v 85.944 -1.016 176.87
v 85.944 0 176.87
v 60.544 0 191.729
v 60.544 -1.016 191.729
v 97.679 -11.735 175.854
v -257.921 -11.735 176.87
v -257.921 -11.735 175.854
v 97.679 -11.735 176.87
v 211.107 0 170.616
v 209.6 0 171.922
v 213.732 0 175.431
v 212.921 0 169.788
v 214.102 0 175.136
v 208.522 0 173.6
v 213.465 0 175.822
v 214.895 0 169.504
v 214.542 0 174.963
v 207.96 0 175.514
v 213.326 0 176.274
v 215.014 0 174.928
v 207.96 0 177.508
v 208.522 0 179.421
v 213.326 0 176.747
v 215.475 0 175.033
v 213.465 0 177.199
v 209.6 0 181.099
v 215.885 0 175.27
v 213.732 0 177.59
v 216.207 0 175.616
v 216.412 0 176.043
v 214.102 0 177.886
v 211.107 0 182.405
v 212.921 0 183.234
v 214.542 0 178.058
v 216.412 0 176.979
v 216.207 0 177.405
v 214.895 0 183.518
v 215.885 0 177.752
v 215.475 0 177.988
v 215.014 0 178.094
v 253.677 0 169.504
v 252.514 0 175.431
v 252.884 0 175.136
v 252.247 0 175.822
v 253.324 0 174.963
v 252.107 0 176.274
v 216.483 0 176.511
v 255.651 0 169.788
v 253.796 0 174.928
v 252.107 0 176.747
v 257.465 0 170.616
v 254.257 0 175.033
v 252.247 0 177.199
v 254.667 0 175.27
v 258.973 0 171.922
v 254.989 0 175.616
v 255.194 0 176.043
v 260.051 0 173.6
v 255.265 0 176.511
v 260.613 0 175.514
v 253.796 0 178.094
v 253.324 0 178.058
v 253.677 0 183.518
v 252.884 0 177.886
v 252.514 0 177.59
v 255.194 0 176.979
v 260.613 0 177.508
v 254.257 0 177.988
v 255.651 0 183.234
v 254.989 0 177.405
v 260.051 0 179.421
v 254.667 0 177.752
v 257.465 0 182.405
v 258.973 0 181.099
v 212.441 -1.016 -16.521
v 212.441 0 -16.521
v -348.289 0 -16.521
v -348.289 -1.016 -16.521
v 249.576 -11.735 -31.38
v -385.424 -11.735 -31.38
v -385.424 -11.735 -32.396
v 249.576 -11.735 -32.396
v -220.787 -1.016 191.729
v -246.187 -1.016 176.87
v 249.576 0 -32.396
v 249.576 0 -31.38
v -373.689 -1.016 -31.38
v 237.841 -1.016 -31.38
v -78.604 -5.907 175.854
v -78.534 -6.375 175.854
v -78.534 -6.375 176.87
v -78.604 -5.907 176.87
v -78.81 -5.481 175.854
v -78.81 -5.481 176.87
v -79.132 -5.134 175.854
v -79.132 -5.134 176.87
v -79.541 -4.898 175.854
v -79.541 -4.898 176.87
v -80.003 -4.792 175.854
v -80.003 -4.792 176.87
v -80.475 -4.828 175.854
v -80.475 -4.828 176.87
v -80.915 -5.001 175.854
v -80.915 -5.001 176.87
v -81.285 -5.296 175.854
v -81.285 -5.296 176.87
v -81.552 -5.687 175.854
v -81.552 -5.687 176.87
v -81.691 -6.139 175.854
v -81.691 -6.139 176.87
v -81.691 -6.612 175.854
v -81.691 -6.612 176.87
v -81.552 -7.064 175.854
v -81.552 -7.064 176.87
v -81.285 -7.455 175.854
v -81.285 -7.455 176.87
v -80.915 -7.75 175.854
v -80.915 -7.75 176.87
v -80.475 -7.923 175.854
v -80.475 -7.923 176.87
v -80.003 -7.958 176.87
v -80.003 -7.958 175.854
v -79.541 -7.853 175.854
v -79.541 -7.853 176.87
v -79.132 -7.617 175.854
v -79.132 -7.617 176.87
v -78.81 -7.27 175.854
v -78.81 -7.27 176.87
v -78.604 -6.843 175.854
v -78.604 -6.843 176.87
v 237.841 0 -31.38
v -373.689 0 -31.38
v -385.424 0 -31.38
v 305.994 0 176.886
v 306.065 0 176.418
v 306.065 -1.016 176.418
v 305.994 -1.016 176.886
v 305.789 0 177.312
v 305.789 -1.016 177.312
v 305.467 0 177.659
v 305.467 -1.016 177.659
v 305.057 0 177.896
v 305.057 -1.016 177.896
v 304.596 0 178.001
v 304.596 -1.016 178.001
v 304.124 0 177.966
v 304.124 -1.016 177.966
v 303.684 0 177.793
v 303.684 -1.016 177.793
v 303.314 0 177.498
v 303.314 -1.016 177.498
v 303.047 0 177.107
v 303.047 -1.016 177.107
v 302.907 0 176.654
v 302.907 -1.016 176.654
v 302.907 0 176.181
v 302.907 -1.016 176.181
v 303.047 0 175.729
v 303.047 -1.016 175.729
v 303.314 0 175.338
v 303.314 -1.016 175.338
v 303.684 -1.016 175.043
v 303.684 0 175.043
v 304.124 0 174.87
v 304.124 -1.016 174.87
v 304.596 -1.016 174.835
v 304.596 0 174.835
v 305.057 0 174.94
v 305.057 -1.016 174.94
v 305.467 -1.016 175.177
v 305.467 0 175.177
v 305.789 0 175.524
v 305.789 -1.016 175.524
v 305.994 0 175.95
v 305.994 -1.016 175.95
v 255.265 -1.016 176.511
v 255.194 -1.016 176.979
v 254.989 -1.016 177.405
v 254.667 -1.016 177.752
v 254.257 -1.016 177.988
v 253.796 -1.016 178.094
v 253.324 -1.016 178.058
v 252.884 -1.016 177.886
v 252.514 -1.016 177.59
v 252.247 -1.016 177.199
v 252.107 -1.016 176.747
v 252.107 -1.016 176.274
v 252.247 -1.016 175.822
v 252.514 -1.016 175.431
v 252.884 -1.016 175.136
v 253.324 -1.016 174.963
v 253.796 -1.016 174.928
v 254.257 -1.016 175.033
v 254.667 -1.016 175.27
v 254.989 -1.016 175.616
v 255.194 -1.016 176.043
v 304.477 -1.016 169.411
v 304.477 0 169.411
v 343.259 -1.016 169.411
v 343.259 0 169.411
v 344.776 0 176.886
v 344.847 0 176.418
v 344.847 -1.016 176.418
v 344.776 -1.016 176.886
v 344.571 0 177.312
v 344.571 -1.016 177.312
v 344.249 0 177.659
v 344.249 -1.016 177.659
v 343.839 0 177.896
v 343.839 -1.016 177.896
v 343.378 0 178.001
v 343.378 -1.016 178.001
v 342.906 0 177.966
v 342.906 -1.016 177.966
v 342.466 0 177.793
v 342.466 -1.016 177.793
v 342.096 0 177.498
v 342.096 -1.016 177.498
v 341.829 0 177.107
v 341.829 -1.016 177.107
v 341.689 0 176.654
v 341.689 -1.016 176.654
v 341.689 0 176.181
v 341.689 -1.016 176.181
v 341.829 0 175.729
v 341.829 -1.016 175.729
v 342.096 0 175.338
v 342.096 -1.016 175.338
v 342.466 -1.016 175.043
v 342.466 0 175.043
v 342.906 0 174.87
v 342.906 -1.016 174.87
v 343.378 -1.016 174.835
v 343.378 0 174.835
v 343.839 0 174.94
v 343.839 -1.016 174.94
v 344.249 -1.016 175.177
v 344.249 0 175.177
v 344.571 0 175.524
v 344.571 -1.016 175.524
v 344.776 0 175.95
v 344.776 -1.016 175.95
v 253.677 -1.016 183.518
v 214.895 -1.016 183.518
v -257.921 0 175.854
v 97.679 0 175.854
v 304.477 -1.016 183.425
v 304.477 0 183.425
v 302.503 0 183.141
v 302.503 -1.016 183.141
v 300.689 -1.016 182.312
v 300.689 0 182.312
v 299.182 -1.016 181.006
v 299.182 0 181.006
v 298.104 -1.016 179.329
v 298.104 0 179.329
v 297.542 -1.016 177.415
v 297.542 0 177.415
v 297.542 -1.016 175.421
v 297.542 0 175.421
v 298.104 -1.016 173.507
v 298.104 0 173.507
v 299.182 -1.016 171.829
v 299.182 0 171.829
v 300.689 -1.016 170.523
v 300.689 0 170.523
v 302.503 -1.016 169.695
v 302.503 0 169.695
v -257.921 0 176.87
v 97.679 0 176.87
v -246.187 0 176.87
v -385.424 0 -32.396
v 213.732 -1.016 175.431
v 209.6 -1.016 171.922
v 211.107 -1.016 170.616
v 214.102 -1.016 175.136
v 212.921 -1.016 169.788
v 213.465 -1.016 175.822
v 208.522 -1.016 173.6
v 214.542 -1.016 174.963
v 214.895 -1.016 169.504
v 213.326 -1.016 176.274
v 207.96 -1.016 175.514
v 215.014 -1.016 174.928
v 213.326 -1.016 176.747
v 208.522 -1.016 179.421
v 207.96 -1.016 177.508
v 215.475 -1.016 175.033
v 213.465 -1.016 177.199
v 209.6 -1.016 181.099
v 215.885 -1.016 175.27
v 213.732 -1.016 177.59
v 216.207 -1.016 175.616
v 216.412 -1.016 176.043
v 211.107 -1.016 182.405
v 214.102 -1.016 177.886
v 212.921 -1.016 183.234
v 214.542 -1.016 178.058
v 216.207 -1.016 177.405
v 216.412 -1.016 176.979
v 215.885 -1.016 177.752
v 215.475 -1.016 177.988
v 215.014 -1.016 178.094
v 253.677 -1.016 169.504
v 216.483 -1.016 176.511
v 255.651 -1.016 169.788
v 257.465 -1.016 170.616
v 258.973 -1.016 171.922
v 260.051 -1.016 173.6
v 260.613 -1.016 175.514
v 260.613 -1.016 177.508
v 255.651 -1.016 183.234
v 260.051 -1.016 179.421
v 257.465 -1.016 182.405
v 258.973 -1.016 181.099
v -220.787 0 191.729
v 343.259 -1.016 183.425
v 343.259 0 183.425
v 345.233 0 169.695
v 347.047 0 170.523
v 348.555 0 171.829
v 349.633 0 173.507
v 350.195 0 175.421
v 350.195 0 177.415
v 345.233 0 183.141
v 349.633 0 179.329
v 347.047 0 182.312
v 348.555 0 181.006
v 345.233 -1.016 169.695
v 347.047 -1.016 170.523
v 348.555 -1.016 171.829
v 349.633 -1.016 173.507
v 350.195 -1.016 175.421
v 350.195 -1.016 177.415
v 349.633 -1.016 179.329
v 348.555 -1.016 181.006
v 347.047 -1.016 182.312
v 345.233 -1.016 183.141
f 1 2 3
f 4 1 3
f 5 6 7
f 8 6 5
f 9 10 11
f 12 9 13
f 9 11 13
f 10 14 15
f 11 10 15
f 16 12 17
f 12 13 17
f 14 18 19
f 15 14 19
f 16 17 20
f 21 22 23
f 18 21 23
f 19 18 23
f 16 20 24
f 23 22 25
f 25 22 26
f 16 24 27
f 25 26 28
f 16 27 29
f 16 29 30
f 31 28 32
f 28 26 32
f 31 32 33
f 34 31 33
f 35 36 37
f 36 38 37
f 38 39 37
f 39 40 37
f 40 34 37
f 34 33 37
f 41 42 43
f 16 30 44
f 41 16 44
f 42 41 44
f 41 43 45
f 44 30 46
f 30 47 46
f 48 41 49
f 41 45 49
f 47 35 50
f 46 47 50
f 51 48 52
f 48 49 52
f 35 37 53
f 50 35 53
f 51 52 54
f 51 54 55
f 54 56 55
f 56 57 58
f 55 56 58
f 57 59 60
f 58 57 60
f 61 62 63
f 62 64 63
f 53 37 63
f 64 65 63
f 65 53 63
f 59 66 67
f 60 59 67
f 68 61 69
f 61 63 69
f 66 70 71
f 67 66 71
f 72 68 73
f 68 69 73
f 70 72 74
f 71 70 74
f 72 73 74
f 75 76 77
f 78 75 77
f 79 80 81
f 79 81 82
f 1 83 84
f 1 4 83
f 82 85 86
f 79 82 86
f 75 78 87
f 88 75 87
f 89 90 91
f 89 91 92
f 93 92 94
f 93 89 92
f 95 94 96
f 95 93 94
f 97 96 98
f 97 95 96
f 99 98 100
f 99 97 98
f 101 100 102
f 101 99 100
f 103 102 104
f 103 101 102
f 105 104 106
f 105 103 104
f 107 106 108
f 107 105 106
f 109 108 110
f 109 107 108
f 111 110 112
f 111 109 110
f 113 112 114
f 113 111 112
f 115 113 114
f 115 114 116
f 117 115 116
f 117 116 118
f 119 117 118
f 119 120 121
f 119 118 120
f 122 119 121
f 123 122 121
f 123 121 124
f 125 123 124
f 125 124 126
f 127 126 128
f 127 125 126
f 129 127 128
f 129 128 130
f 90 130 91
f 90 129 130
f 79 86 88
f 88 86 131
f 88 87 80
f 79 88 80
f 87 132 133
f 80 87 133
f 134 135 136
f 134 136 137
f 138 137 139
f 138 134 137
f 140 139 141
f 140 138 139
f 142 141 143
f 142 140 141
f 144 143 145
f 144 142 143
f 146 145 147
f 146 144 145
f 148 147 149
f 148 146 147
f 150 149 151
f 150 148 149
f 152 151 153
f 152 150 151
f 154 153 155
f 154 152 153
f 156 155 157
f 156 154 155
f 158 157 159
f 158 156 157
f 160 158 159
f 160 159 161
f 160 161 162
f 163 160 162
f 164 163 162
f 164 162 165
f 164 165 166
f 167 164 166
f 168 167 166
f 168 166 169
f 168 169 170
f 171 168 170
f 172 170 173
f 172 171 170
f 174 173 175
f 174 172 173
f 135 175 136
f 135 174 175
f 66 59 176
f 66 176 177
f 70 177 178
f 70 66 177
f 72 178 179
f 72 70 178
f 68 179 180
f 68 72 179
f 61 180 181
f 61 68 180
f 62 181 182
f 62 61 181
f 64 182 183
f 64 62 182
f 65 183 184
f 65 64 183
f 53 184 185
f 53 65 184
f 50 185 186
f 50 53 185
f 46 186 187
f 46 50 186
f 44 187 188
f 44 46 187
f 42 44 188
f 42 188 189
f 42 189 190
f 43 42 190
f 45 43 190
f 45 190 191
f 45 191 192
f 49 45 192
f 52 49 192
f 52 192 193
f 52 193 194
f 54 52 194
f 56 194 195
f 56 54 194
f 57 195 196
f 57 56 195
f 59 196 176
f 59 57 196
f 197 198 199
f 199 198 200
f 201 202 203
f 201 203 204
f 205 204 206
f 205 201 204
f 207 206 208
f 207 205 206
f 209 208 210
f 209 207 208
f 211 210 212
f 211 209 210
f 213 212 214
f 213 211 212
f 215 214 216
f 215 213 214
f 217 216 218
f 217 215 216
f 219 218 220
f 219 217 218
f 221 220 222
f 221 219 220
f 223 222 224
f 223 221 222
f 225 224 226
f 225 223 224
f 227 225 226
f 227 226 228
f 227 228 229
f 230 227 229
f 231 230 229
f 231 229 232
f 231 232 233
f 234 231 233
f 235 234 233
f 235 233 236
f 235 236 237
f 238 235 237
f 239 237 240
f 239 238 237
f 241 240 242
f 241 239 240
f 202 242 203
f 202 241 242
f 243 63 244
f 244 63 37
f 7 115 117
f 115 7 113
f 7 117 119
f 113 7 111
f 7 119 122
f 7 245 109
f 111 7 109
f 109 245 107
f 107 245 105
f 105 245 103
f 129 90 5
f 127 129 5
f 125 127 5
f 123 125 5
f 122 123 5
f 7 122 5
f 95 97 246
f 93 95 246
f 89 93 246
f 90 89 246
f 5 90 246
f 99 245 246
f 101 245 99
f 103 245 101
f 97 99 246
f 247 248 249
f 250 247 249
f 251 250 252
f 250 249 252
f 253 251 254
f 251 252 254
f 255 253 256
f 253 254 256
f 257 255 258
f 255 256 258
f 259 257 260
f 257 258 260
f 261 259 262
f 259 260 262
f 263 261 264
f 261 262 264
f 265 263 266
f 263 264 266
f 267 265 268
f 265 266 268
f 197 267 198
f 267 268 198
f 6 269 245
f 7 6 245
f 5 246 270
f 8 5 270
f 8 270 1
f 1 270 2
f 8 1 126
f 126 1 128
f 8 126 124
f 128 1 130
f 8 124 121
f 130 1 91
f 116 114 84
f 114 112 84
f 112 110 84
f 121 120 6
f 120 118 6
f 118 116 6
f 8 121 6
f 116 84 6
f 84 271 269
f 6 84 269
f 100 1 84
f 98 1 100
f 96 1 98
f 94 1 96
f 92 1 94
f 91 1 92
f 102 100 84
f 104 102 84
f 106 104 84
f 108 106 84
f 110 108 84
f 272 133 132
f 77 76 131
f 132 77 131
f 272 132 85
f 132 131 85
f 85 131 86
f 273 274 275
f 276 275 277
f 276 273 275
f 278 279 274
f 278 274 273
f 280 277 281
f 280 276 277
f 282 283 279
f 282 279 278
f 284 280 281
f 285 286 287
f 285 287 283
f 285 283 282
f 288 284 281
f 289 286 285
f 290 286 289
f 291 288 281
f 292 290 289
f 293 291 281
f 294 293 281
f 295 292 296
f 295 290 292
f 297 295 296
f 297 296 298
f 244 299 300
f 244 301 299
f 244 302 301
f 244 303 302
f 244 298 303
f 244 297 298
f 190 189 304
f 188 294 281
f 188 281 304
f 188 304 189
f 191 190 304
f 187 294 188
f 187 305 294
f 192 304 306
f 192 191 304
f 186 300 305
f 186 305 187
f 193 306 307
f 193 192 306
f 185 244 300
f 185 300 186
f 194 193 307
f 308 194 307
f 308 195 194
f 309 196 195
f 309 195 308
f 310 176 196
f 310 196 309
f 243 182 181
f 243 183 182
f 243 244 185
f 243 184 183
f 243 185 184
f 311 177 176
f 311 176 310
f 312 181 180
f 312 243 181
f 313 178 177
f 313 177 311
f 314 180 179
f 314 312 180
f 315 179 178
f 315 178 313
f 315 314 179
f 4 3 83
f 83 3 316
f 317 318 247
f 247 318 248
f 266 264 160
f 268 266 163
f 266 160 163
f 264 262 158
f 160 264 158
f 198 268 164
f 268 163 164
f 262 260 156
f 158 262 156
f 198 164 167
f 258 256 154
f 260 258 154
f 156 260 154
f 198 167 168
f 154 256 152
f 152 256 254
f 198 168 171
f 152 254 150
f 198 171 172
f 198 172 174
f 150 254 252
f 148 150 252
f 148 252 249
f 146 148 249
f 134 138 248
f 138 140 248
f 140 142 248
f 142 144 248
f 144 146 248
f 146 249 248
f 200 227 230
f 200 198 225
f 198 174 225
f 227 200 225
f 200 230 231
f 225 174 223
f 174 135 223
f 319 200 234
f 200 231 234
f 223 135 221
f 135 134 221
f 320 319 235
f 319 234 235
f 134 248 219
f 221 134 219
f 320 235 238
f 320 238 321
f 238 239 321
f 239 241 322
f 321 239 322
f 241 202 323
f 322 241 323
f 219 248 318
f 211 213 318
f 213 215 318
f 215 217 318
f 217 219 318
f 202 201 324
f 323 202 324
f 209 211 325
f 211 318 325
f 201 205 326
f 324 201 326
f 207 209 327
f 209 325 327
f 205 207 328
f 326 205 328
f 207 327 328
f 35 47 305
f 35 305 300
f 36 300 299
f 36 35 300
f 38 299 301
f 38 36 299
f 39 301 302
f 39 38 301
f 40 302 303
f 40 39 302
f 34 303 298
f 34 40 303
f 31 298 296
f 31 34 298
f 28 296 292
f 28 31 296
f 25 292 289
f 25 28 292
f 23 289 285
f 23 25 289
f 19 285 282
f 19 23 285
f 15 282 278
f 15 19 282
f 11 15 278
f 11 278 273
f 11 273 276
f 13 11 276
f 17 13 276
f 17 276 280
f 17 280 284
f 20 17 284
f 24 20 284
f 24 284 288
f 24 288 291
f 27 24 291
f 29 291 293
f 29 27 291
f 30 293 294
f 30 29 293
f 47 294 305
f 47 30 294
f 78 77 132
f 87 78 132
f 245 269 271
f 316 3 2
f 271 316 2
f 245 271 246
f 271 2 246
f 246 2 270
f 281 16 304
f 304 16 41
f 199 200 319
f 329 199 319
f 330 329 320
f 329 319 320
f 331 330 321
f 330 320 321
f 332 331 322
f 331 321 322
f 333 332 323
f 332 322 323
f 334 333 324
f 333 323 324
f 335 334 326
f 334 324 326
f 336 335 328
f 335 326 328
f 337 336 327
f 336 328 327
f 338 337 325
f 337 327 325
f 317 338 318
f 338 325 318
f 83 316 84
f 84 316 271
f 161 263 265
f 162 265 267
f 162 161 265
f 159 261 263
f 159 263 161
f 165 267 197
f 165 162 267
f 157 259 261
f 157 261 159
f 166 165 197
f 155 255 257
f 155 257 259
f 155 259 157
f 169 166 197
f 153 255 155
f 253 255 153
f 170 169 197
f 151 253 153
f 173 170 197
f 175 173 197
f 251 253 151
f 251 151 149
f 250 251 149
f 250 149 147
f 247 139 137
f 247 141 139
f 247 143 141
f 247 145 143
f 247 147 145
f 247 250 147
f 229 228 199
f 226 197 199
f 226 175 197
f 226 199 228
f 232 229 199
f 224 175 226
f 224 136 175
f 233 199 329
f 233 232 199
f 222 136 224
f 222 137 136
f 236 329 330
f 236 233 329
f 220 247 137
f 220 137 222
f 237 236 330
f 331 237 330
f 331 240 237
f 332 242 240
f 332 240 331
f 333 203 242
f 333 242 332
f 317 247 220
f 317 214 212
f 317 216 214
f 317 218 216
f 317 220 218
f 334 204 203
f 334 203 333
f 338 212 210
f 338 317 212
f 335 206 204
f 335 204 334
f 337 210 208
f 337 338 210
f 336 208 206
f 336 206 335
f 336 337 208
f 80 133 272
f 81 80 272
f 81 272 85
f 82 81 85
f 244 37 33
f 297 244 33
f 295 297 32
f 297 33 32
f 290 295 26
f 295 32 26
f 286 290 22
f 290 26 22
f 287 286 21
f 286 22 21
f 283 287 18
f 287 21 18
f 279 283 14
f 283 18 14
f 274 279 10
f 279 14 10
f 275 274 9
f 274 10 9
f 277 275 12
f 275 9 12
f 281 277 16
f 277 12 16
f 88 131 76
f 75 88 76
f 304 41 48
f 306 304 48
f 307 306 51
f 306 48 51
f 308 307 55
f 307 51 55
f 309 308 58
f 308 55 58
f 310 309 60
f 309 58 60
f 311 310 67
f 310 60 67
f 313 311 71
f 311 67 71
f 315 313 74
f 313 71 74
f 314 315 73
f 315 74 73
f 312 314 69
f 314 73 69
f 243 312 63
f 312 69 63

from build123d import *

# Parameters (mm, degrees)
F1_DEPTH = 11.7348
F2_R     = 1.5875
F3_DEPTH = 1.016
F4_T     = 1.016
F5_T     = 1.016
F6_R     = 1.5875
F7_DEPTH = 228.6


# Not quite as in the source:
# - a shell that OpenCascade refuses in one call is made with other operations: the cavity is built on its own and cut out


with BuildPart() as f1:
    # F0 (on Front) → F1 (new body)
    with BuildSketch(Plane.XZ):
        Polygon((-385.423819233, -32.3961665051), (-373.689019233, -32.3961665051), (237.841380767, -32.3961665051), (249.576180767, -32.3961665051), (249.576180767, -31.3801665051), (237.841380767, -31.3801665051), (212.441380767, -16.5211665051), (-348.289019233, -16.5211665051), (-373.689019233, -31.3801665051), (-385.423819233, -31.3801665051), align=None)
    extrude(amount=F1_DEPTH)

    # F4: shell of thickness 1.016, made by hand


with BuildPart() as f1b:
    # F0 (on Front) → F1, piece 2 (new body)
    with BuildSketch(Plane.XZ):
        Polygon((-257.9213991354, 175.8537739515), (-246.1865991354, 175.8537739515), (85.9438008646, 175.8537739515), (97.6786008646, 175.8537739515), (97.6786008646, 176.8697739515), (85.9438008646, 176.8697739515), (60.5438008646, 191.7287739515), (-220.7865991354, 191.7287739515), (-246.1865991354, 176.8697739515), (-257.9213991354, 176.8697739515), align=None)
    extrude(amount=F1_DEPTH)

    # F5: shell of thickness 1.016, made by hand


with BuildPart() as f3:
    # F2 (on Front) → F3 (new body)
    with BuildSketch(Plane.XZ):
        with BuildLine():
            Line((253.6772660458, 183.5175923166), (214.8952760458, 183.5175923166))
            ThreePointArc((214.8952760458, 183.5175923166), (207.888375372, 176.5106916428), (214.8952760458, 169.503790969))
            Line((214.8952760458, 169.503790969), (253.6772660458, 169.503790969))
            ThreePointArc((253.6772660458, 169.503790969), (260.6841667196, 176.5106916428), (253.6772660458, 183.5175923166))
        make_face()
        with Locations((214.8952760458, 176.5106916428)):
            Circle(F2_R, mode=Mode.SUBTRACT)
        with Locations((253.6772660458, 176.5106916428)):
            Circle(F2_R, mode=Mode.SUBTRACT)
    extrude(amount=F3_DEPTH)


with BuildPart() as f3b:
    # F2 (on Front) → F3, piece 2 (new body)
    with BuildSketch(Plane.XZ):
        with BuildLine():
            Line((343.2592560458, 183.4247431812), (304.4772660458, 183.4247431812))
            ThreePointArc((304.4772660458, 183.4247431812), (297.470365372, 176.4178425074), (304.4772660458, 169.4109418336))
            Line((304.4772660458, 169.4109418336), (343.2592560458, 169.4109418336))
            ThreePointArc((343.2592560458, 169.4109418336), (350.2661567196, 176.4178425074), (343.2592560458, 183.4247431812))
        make_face()
        with Locations((304.4772660458, 176.4178425074)):
            Circle(F2_R, mode=Mode.SUBTRACT)
        with Locations((343.2592560458, 176.4178425074)):
            Circle(F2_R, mode=Mode.SUBTRACT)
    extrude(amount=F3_DEPTH)


with BuildPart() as f4_core1:
    # F4_t2: copy of F1
    add(f1.part)

    # the walls: a layer under each face that stays
    f4_faces = [f4_core1.faces().sort_by_distance(p)[0] for p in [
        (-67.923819233, -5.8674, -32.3961665051),
        (-67.923819233, 0, -24.4586665051),
        (-379.556419233, -5.8674, -31.3801665051),
        (243.708780767, -5.8674, -31.3801665051),
        (249.576180767, -5.8674, -31.8881665051),
        (-385.423819233, -5.8674, -31.8881665051),
    ]]
    thicken(f4_faces, amount=-F4_T, mode=Mode.SUBTRACT)


with BuildPart() as f1_1:
    add(f1.part)

    # what is left inside the walls is the cavity
    f4_cavity = [f4_core1.part.solids().sort_by_distance(p)[0] for p in [
        (-67.923819, -1.02616, -26.427167),
    ]]
    add(f4_cavity, mode=Mode.SUBTRACT)


with BuildPart() as f5_core1:
    # F5_t2: copy of F1b
    add(f1b.part)

    # the walls: a layer under each face that stays
    f5_faces = [f5_core1.faces().sort_by_distance(p)[0] for p in [
        (-80.1213991354, -5.8674, 175.8537739515),
        (-80.1213991354, 0, 183.7912739515),
        (-252.0539991354, -5.8674, 176.8697739515),
        (91.8112008646, -5.8674, 176.8697739515),
        (97.6786008646, -5.8674, 176.3617739515),
        (-257.9213991354, -5.8674, 176.3617739515),
    ]]
    thicken(f5_faces, amount=-F5_T, mode=Mode.SUBTRACT)


with BuildPart() as f1b_1:
    add(f1b.part)

    # what is left inside the walls is the cavity
    f5_cavity = [f5_core1.part.solids().sort_by_distance(p)[0] for p in [
        (-80.121399, -1.02616, 181.822774),
    ]]
    add(f5_cavity, mode=Mode.SUBTRACT)

    # F6 (on Top) → F7 (cut)
    with BuildSketch(Plane.XY):
        with Locations((-80.1213991354, -6.3754)):
            Circle(F6_R)
    extrude(amount=F7_DEPTH, mode=Mode.SUBTRACT)


solid = Compound([f3.part, f3b.part, f1_1.part, f1b_1.part])
